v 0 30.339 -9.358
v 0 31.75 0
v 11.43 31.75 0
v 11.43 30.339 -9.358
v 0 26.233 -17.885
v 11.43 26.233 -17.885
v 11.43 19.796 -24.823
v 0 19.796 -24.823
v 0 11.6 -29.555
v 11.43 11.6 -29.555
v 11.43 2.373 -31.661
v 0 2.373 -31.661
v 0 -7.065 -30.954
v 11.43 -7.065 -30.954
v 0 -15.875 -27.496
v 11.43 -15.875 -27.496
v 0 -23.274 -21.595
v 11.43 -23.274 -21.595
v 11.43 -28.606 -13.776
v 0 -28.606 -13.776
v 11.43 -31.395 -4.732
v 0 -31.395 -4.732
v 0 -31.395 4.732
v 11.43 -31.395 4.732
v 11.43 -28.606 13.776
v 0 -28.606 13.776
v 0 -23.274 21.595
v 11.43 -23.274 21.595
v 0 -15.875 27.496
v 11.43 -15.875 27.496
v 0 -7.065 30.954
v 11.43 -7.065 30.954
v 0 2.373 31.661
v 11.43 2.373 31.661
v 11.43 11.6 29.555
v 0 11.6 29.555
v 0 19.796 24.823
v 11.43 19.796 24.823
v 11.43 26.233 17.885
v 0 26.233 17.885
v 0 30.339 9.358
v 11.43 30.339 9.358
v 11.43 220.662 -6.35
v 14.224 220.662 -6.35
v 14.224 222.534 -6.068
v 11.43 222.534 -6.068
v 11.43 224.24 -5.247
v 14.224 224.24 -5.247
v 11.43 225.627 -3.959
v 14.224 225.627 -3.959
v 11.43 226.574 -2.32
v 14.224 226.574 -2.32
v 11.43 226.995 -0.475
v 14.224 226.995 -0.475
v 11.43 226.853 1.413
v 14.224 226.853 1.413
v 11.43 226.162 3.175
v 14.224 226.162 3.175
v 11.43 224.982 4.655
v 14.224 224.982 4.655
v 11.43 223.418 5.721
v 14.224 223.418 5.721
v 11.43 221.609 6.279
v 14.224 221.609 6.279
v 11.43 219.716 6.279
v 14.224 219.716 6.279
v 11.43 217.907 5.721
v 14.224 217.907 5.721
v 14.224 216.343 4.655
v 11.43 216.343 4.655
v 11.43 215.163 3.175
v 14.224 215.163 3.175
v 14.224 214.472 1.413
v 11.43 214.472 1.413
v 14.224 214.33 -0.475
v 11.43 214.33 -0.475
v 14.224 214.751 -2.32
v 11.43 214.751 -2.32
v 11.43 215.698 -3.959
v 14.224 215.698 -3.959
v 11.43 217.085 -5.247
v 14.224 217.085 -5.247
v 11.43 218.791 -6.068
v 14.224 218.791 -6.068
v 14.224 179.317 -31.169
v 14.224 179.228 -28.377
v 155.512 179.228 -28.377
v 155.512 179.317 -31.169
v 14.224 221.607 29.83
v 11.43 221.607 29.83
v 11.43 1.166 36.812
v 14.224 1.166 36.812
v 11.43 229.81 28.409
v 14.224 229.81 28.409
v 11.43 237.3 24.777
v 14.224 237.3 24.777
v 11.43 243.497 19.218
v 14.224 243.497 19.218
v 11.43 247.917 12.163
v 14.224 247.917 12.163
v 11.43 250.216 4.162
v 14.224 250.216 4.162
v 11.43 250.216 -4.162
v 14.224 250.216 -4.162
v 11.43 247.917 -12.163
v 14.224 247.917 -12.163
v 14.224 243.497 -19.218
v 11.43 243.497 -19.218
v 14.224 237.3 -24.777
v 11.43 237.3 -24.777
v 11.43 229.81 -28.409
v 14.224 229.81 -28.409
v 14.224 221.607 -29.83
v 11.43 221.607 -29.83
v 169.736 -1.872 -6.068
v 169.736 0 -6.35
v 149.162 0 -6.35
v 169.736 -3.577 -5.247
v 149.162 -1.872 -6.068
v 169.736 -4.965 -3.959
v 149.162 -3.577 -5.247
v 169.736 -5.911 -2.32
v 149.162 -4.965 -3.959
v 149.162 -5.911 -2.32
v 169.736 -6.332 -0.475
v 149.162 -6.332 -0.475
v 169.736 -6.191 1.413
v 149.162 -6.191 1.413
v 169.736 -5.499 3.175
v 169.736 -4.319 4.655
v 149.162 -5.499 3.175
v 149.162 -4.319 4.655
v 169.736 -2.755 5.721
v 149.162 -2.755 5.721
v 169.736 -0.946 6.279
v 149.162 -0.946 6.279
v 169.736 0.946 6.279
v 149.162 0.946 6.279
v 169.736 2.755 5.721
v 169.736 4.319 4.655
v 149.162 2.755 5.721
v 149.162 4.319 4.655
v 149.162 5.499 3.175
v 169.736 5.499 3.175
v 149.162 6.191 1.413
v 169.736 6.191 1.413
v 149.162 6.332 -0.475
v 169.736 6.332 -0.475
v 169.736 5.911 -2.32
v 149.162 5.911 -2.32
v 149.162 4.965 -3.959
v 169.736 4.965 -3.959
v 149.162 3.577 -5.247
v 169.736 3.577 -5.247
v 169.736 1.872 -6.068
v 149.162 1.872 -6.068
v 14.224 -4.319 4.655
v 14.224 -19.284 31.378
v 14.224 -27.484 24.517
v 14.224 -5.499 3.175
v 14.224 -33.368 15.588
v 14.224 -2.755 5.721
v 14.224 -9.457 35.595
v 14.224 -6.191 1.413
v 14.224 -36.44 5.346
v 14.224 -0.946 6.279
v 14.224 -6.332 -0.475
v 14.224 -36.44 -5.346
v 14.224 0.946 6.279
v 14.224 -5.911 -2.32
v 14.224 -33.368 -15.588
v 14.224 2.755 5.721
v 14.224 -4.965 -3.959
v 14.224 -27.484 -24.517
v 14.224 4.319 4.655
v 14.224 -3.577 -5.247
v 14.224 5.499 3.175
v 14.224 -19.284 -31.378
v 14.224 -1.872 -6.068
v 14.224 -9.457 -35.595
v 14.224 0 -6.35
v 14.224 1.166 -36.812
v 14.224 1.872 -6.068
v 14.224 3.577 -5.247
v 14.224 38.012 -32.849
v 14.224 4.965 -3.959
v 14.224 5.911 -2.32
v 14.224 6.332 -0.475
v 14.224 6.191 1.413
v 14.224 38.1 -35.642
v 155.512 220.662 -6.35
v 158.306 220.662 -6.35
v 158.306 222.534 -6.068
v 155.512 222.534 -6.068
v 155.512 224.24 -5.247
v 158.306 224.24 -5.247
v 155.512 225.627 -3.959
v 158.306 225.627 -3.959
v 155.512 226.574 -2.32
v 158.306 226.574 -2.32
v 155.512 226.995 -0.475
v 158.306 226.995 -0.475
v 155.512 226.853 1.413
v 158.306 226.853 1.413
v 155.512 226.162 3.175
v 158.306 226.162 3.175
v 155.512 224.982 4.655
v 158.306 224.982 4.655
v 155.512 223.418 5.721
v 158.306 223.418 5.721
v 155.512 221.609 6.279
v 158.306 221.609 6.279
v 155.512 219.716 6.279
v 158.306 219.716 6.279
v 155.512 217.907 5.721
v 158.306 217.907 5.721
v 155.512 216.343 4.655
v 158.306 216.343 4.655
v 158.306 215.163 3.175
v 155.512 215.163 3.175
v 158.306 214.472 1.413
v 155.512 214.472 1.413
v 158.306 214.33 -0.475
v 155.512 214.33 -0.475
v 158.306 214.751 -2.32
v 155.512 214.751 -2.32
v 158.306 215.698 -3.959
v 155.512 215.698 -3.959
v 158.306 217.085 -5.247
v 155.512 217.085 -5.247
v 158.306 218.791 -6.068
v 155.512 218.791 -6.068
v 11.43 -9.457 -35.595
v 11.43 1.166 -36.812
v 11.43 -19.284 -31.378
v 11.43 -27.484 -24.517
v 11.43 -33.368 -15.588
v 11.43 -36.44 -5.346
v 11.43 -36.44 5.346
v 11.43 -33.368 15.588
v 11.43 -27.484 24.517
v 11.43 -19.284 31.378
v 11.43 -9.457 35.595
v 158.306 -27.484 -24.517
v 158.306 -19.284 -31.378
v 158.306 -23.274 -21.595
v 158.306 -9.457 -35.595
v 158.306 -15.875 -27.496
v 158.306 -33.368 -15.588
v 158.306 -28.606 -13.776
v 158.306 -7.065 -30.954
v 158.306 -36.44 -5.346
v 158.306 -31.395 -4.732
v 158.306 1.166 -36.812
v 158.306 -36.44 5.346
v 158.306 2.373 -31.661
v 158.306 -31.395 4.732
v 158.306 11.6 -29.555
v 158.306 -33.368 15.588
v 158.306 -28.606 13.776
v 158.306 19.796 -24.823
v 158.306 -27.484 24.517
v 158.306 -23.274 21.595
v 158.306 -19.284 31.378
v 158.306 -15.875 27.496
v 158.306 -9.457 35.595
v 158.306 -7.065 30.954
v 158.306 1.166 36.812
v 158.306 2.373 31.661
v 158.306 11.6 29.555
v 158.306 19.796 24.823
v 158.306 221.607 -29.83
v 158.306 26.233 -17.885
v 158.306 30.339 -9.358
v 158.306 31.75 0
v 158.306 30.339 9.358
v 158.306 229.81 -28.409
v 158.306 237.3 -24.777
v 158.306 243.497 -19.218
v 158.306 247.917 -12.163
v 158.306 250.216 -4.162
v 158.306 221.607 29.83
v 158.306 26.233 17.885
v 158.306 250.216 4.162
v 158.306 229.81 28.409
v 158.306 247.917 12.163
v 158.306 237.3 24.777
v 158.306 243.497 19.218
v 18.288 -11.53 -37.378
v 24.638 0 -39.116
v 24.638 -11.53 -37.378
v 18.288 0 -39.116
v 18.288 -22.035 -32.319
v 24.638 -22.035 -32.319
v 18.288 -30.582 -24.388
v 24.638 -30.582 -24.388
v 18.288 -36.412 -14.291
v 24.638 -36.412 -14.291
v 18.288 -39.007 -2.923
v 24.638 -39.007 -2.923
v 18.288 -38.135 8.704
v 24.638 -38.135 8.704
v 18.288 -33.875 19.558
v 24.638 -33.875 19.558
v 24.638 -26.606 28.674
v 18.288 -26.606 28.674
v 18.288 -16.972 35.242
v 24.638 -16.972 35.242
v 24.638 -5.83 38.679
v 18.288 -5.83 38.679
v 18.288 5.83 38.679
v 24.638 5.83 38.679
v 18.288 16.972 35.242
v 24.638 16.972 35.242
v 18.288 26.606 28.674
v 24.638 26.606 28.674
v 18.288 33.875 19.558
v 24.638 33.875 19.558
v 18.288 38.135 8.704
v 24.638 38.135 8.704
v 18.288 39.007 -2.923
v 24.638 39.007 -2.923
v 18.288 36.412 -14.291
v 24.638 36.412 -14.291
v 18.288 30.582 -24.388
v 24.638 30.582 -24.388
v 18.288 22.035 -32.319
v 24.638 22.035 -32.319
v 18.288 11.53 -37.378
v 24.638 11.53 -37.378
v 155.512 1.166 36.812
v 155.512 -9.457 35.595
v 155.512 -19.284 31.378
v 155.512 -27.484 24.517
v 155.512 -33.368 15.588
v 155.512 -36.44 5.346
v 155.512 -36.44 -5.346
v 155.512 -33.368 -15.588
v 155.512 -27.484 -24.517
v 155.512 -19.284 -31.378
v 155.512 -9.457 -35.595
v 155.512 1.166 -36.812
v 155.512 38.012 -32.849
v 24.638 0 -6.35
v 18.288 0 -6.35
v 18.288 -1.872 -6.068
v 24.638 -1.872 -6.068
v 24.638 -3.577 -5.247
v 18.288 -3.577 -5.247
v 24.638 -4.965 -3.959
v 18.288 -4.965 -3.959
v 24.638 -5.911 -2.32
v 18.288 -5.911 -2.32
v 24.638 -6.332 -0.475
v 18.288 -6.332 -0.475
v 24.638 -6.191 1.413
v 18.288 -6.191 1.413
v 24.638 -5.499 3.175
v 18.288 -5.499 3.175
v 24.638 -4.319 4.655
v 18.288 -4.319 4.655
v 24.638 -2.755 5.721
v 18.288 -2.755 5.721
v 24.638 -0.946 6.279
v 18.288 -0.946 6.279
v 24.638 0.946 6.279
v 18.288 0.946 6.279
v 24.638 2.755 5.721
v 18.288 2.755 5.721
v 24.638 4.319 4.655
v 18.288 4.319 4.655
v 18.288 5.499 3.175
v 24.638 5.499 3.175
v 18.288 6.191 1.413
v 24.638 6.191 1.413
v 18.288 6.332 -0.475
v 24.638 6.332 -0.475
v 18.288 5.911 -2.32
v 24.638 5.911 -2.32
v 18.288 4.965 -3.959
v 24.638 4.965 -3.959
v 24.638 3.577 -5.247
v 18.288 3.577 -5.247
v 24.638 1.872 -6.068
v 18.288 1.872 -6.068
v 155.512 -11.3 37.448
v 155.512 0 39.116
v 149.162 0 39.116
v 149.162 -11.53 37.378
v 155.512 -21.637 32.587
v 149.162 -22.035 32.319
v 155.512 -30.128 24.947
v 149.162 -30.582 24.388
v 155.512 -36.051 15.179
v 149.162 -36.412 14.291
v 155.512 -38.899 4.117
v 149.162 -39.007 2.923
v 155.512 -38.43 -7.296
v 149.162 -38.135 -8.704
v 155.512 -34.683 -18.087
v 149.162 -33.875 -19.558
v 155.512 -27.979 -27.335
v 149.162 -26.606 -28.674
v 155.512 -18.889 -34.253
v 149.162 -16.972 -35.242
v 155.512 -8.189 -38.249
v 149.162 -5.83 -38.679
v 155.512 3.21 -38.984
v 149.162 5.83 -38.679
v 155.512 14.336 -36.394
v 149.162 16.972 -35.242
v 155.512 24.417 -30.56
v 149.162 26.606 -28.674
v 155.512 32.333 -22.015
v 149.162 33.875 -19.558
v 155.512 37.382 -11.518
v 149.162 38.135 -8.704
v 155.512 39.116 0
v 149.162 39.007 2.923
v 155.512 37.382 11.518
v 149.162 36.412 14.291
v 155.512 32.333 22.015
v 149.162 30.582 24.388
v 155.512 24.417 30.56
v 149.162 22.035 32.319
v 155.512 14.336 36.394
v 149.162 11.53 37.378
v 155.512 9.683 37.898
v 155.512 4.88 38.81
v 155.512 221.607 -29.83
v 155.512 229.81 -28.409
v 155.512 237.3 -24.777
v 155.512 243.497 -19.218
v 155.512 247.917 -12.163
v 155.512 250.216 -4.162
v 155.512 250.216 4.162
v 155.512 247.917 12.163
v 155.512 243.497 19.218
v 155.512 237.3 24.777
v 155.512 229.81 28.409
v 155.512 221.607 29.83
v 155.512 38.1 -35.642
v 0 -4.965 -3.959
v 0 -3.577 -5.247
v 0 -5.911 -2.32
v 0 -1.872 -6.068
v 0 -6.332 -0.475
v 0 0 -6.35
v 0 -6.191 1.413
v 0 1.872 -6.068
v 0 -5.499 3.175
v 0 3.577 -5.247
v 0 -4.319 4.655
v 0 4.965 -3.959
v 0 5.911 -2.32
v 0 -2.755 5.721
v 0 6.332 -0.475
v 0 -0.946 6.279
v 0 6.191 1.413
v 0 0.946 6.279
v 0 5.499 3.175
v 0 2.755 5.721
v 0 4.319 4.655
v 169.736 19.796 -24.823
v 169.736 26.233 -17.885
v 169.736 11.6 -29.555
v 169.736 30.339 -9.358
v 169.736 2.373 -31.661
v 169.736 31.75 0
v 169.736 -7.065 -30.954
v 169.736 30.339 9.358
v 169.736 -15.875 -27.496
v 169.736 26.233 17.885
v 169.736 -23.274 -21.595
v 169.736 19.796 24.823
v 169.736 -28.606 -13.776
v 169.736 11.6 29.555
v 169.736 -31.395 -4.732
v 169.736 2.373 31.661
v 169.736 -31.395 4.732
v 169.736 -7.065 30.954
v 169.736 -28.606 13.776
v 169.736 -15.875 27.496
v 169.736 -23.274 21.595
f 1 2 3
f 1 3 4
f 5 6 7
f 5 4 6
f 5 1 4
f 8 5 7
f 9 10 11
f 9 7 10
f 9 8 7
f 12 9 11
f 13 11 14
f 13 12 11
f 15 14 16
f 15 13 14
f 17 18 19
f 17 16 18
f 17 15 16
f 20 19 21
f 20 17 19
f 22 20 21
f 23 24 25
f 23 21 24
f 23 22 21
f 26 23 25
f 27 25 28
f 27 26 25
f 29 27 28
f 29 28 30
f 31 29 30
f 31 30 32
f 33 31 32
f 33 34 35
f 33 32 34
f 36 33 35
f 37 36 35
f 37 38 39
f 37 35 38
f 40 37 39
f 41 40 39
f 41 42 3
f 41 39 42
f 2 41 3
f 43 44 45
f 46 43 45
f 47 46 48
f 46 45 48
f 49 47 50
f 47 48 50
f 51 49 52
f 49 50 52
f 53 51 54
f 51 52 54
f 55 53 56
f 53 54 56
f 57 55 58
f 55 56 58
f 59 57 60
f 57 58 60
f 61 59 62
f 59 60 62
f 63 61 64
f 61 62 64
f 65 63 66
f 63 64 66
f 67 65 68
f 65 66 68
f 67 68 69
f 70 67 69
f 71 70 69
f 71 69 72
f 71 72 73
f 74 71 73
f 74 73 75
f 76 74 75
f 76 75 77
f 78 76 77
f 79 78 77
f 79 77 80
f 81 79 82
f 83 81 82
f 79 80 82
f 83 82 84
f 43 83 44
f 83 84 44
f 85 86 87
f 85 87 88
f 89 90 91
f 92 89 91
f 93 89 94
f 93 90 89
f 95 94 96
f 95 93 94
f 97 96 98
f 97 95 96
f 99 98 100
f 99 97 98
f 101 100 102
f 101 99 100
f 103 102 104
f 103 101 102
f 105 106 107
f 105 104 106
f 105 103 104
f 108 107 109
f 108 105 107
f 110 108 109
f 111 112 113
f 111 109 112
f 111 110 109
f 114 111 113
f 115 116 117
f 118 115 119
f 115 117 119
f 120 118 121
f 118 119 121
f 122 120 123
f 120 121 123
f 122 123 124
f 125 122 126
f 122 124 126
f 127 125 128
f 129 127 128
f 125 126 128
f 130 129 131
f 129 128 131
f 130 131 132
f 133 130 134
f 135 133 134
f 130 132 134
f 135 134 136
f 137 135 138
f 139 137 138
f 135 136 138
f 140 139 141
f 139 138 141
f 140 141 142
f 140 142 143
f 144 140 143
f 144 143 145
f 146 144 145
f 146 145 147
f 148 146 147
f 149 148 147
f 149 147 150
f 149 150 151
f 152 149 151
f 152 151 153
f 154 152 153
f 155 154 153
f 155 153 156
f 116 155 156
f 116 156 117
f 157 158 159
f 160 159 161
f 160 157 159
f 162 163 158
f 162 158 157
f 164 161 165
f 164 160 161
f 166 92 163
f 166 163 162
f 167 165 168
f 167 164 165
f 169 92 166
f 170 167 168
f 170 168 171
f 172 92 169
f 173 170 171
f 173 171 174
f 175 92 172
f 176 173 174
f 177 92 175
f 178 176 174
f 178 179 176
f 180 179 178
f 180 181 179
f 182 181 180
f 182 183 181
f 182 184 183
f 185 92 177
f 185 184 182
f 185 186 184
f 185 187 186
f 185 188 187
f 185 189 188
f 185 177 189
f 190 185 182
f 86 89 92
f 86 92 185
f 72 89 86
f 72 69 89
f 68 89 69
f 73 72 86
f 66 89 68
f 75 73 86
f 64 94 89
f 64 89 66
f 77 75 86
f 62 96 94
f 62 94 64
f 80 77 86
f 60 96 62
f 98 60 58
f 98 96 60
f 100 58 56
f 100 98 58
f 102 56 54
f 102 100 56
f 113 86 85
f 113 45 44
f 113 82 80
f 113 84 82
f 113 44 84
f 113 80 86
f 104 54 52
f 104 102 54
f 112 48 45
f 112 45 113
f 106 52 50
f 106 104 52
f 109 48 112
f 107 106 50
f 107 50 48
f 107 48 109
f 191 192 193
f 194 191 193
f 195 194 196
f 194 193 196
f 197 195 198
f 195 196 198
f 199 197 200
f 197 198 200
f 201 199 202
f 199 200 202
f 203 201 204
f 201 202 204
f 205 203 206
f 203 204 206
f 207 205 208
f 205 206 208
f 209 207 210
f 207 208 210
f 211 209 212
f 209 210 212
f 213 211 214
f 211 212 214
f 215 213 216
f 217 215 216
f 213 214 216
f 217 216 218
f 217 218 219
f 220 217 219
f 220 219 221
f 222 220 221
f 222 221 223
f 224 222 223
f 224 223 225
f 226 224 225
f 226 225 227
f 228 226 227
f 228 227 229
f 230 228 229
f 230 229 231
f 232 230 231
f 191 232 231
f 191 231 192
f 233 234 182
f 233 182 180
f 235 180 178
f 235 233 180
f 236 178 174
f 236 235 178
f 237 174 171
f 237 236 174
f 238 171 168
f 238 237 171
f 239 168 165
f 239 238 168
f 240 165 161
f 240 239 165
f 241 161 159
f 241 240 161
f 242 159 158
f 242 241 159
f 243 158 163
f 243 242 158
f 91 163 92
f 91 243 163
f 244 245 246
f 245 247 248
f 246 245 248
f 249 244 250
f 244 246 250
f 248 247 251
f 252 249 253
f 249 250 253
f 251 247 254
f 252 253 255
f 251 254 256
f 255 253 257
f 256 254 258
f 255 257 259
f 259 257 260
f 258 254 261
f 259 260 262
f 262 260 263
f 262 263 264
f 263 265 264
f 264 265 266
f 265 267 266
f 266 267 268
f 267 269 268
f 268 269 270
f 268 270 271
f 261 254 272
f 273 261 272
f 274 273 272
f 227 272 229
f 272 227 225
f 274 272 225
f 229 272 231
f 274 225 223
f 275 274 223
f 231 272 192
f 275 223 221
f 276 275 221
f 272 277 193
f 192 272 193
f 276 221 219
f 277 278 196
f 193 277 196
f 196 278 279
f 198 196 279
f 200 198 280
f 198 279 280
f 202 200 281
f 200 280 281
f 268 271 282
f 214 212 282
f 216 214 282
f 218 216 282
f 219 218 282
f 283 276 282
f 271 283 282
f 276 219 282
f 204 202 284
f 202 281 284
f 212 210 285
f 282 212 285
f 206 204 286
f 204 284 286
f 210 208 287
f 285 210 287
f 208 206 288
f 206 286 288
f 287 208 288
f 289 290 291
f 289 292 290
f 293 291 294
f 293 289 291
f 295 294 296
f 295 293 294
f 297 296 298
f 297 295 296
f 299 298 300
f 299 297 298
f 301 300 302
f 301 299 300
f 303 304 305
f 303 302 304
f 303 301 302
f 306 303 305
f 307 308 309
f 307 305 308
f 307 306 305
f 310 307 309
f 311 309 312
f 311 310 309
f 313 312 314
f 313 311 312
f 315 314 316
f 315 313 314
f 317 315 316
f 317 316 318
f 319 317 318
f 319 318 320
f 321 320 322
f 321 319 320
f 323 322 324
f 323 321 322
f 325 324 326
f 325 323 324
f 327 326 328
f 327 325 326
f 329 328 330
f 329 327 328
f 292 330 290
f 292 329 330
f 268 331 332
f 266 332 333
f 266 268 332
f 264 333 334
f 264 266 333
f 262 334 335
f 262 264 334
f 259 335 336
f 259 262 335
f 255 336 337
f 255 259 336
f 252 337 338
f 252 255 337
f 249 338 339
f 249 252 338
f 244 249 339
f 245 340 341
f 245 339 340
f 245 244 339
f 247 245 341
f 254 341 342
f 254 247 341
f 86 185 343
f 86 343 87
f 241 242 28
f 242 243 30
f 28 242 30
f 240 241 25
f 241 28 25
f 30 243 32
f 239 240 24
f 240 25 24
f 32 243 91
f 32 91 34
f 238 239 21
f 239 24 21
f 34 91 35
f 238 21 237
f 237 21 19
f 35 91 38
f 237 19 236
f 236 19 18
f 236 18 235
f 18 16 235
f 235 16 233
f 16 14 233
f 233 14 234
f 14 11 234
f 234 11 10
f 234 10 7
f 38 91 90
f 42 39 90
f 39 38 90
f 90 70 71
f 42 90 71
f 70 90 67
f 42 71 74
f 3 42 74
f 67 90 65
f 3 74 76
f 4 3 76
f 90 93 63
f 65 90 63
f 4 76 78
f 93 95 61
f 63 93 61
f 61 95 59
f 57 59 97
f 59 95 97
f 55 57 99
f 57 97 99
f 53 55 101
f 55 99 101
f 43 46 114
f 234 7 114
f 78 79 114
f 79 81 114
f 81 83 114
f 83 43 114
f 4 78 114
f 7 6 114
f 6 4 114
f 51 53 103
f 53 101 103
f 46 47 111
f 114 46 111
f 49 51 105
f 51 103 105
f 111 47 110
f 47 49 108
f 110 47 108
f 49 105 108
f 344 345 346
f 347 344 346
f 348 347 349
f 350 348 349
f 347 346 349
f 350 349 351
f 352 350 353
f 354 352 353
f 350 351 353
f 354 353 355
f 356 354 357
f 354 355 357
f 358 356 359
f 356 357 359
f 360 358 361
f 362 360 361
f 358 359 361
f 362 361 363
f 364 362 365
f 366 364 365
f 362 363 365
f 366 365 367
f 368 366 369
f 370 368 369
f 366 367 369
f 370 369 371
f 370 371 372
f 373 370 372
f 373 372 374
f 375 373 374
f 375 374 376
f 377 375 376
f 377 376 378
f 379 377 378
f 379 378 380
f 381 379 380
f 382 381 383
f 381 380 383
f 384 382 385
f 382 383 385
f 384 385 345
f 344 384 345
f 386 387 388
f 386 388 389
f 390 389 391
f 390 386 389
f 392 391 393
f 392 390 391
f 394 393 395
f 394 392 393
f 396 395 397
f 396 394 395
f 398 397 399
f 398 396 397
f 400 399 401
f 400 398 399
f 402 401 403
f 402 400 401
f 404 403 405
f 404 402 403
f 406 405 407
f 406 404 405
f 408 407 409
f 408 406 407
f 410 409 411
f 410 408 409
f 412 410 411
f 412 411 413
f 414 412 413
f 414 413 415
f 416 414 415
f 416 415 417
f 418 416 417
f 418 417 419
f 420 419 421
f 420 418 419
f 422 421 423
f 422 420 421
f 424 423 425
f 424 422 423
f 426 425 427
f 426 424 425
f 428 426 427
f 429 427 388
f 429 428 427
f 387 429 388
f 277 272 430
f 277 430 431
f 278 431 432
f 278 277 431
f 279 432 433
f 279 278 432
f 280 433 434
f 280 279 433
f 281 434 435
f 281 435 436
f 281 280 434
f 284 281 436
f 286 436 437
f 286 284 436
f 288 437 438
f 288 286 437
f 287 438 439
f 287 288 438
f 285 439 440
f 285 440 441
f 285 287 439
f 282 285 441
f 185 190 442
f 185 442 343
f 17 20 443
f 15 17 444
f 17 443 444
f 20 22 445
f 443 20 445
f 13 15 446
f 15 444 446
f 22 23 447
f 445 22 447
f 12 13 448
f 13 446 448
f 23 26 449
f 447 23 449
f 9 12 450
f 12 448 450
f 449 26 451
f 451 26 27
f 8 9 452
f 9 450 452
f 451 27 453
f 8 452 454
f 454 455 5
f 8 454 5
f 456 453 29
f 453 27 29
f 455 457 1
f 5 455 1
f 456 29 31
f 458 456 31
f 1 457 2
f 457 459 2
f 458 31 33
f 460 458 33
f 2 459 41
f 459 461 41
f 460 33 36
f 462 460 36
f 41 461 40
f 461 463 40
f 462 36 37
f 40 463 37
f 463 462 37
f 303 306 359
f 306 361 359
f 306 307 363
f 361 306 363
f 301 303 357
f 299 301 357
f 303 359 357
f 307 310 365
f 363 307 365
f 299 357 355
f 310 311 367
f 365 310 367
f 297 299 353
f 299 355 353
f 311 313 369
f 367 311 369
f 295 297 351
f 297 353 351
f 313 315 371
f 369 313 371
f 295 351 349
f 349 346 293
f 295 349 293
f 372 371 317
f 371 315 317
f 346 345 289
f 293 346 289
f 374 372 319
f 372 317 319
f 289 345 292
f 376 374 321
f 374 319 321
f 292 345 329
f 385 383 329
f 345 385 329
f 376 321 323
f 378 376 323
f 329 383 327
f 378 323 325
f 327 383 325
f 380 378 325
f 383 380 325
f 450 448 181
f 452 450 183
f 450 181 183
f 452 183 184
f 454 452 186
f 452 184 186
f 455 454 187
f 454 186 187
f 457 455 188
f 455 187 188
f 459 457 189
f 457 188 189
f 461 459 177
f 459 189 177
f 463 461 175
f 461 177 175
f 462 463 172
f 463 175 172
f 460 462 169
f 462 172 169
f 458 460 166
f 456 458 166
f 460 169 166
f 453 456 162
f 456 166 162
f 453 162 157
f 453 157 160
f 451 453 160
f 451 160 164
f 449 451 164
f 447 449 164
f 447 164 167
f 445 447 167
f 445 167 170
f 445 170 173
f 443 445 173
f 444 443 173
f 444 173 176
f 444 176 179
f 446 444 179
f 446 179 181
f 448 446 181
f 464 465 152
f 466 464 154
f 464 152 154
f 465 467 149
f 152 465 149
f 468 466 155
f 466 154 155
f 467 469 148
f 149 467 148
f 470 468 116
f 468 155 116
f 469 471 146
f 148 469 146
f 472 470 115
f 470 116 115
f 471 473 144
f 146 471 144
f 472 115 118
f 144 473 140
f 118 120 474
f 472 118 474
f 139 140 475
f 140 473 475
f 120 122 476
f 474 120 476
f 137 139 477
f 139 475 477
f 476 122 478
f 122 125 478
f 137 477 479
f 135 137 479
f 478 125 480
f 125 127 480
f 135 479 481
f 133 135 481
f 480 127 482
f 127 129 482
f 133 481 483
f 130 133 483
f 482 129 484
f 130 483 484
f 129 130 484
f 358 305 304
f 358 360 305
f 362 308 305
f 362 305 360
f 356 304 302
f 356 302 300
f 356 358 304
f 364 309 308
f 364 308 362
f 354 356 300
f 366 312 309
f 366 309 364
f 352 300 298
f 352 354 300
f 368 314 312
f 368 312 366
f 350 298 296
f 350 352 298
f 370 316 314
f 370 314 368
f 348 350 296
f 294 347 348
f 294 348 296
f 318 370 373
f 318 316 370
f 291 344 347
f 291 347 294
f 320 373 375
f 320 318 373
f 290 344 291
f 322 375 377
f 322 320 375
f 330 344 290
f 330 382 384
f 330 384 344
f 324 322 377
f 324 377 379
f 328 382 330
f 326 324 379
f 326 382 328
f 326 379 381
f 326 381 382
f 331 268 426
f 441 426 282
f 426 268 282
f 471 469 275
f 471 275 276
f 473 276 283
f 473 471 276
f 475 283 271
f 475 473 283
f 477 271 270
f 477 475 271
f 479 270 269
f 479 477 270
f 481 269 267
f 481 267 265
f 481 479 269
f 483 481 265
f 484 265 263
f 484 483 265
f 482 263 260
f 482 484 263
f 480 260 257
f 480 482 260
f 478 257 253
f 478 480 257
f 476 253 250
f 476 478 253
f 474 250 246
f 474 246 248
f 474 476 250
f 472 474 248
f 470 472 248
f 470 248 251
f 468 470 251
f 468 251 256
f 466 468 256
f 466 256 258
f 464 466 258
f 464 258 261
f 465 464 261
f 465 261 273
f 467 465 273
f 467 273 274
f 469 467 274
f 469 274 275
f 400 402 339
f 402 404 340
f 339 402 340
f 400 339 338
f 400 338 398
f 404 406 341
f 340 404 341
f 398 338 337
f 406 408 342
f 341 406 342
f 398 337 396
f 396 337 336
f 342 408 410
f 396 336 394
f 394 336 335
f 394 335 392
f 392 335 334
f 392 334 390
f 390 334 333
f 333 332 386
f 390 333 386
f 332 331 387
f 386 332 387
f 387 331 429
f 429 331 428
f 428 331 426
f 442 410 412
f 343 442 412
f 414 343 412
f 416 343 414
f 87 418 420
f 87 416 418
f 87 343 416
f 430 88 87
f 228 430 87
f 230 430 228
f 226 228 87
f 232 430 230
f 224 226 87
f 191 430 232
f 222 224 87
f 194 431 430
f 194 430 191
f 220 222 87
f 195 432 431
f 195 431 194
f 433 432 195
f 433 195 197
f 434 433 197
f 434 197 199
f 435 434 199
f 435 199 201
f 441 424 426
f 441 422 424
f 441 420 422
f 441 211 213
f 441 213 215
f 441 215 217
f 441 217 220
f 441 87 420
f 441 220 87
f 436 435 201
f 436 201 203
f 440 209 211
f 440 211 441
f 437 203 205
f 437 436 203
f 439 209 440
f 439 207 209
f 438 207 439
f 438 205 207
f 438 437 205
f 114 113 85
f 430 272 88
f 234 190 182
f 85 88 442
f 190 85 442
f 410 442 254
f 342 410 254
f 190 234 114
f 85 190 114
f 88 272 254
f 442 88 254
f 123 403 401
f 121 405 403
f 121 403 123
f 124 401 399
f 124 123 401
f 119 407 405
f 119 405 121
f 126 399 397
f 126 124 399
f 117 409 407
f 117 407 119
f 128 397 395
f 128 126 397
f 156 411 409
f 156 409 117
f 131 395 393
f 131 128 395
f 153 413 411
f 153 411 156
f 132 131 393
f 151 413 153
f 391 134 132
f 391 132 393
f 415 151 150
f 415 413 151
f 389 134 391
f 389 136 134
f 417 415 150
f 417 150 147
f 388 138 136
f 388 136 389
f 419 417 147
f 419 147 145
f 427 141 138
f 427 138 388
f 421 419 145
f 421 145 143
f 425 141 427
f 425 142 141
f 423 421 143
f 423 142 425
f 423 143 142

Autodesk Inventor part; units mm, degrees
sketch "Sketch1" plane through (0, 0, 0) normal (1, 0, 0) x (0, 1, 0)
  circle A0 centre (0, 0) radius 31.75
  dimension "d0" = 63.5
extrude "Extrusion1" add sketch "Sketch1" along normal blind 11.43
sketch "Sketch2" plane through (11.43, 0, 0) normal (1, 0, 0) x (0, 0, -1)
  circle A0 centre (0, 0) radius 36.83
  circle A1 centre (0, 0) radius 31.75 projected
  circle A2 centre (0, 220.6625) radius 29.845
  line L0 (-29.83, 221.6072) -> (-36.8115, 1.1658)
  line L1 (36.8115, 1.1658) -> (29.83, 221.6072)
  line L2 (0, 220.6625) -> (0, 0) construction
  dimension "d3" = 5.08
  dimension "d4" = 59.69
  dimension "d5" = 220.6625
extrude "Extrusion2" add sketch "Sketch2" along normal blind 2.794 contours A0 | A0 L0 A2 L1 | A2 | A1
ref_plane "Work Plane1" through (18.288, 0, 0) normal (1, 0, 0) x (0, 0, -1)
sketch "Sketch4" plane through (18.288, 0, 0) normal (1, 0, 0) x (0, 0, -1)
  circle A0 centre (0, 0) radius 39.116
  dimension "d12" = 78.232
extrude "Extrusion4" add sketch "Sketch4" along normal blind 6.35
ref_plane "Work Plane2" through (155.5115, 0, 0) normal (1, 0, 0) x (0, 0, -1)
sketch "Sketch5" plane through (14.224, 0, 0) normal (1, 0, 0) x (0, 0, -1)
  line L0 (36.8115, 1.1658) -> (29.83, 221.6072) projected
  line L1 (35.6418, 38.1) -> (32.8492, 38.0116)
  line L2 (32.8492, 38.0116) -> (28.3768, 179.2283)
  line L3 (28.3768, 179.2283) -> (31.1694, 179.3167)
  point P0 (0, 0)
  dimension "d16" = 2.794
  dimension "d17" = 141.2875
  dimension "d18" = 38.1
extrude "Extrusion5" add sketch "Sketch5" along normal up to surface (141.2875 mm away)
ref_plane "Work Plane3" through (84.8678, 0, 0) normal (1, 0, 0) x (0, 0, -1)
mirror "Mirror1" about plane through (84.8678, 0, 0) normal (1, 0, 0) of "Extrusion2", "Extrusion1"
sketch "Sketch6" plane through (155.5115, 0, 0) normal (-1, 0, 0) x (0, 0, 1)
  circle A0 centre (0, 0) radius 39.116 projected
extrude "Extrusion6" add sketch "Sketch6" along normal blind 6.35
sketch "Sketch3" plane through (14.224, 0, 0) normal (1, 0, 0) x (0, 0, -1)
  circle A0 centre (0, 0) radius 6.35
  dimension "d8" = 12.7
extrude "Extrusion3" cut sketch "Sketch3" along normal through all both and the other way through all
sketch "Sketch7" plane through (158.3055, 0, 0) normal (1, 0, 0) x (0, 0, -1)
  arc A0 (29.83, 221.6072) -> (-29.83, 221.6072) centre (0, 220.6625) ccw projected
  circle A1 centre (0, 220.6625) radius 6.35
  point P0 (0, 0)
  dimension "d24" = 12.7
extrude "Extrusion7" cut sketch "Sketch7" against normal through all
properties part number "2nd_Arm" material "Aluminum 6061"
